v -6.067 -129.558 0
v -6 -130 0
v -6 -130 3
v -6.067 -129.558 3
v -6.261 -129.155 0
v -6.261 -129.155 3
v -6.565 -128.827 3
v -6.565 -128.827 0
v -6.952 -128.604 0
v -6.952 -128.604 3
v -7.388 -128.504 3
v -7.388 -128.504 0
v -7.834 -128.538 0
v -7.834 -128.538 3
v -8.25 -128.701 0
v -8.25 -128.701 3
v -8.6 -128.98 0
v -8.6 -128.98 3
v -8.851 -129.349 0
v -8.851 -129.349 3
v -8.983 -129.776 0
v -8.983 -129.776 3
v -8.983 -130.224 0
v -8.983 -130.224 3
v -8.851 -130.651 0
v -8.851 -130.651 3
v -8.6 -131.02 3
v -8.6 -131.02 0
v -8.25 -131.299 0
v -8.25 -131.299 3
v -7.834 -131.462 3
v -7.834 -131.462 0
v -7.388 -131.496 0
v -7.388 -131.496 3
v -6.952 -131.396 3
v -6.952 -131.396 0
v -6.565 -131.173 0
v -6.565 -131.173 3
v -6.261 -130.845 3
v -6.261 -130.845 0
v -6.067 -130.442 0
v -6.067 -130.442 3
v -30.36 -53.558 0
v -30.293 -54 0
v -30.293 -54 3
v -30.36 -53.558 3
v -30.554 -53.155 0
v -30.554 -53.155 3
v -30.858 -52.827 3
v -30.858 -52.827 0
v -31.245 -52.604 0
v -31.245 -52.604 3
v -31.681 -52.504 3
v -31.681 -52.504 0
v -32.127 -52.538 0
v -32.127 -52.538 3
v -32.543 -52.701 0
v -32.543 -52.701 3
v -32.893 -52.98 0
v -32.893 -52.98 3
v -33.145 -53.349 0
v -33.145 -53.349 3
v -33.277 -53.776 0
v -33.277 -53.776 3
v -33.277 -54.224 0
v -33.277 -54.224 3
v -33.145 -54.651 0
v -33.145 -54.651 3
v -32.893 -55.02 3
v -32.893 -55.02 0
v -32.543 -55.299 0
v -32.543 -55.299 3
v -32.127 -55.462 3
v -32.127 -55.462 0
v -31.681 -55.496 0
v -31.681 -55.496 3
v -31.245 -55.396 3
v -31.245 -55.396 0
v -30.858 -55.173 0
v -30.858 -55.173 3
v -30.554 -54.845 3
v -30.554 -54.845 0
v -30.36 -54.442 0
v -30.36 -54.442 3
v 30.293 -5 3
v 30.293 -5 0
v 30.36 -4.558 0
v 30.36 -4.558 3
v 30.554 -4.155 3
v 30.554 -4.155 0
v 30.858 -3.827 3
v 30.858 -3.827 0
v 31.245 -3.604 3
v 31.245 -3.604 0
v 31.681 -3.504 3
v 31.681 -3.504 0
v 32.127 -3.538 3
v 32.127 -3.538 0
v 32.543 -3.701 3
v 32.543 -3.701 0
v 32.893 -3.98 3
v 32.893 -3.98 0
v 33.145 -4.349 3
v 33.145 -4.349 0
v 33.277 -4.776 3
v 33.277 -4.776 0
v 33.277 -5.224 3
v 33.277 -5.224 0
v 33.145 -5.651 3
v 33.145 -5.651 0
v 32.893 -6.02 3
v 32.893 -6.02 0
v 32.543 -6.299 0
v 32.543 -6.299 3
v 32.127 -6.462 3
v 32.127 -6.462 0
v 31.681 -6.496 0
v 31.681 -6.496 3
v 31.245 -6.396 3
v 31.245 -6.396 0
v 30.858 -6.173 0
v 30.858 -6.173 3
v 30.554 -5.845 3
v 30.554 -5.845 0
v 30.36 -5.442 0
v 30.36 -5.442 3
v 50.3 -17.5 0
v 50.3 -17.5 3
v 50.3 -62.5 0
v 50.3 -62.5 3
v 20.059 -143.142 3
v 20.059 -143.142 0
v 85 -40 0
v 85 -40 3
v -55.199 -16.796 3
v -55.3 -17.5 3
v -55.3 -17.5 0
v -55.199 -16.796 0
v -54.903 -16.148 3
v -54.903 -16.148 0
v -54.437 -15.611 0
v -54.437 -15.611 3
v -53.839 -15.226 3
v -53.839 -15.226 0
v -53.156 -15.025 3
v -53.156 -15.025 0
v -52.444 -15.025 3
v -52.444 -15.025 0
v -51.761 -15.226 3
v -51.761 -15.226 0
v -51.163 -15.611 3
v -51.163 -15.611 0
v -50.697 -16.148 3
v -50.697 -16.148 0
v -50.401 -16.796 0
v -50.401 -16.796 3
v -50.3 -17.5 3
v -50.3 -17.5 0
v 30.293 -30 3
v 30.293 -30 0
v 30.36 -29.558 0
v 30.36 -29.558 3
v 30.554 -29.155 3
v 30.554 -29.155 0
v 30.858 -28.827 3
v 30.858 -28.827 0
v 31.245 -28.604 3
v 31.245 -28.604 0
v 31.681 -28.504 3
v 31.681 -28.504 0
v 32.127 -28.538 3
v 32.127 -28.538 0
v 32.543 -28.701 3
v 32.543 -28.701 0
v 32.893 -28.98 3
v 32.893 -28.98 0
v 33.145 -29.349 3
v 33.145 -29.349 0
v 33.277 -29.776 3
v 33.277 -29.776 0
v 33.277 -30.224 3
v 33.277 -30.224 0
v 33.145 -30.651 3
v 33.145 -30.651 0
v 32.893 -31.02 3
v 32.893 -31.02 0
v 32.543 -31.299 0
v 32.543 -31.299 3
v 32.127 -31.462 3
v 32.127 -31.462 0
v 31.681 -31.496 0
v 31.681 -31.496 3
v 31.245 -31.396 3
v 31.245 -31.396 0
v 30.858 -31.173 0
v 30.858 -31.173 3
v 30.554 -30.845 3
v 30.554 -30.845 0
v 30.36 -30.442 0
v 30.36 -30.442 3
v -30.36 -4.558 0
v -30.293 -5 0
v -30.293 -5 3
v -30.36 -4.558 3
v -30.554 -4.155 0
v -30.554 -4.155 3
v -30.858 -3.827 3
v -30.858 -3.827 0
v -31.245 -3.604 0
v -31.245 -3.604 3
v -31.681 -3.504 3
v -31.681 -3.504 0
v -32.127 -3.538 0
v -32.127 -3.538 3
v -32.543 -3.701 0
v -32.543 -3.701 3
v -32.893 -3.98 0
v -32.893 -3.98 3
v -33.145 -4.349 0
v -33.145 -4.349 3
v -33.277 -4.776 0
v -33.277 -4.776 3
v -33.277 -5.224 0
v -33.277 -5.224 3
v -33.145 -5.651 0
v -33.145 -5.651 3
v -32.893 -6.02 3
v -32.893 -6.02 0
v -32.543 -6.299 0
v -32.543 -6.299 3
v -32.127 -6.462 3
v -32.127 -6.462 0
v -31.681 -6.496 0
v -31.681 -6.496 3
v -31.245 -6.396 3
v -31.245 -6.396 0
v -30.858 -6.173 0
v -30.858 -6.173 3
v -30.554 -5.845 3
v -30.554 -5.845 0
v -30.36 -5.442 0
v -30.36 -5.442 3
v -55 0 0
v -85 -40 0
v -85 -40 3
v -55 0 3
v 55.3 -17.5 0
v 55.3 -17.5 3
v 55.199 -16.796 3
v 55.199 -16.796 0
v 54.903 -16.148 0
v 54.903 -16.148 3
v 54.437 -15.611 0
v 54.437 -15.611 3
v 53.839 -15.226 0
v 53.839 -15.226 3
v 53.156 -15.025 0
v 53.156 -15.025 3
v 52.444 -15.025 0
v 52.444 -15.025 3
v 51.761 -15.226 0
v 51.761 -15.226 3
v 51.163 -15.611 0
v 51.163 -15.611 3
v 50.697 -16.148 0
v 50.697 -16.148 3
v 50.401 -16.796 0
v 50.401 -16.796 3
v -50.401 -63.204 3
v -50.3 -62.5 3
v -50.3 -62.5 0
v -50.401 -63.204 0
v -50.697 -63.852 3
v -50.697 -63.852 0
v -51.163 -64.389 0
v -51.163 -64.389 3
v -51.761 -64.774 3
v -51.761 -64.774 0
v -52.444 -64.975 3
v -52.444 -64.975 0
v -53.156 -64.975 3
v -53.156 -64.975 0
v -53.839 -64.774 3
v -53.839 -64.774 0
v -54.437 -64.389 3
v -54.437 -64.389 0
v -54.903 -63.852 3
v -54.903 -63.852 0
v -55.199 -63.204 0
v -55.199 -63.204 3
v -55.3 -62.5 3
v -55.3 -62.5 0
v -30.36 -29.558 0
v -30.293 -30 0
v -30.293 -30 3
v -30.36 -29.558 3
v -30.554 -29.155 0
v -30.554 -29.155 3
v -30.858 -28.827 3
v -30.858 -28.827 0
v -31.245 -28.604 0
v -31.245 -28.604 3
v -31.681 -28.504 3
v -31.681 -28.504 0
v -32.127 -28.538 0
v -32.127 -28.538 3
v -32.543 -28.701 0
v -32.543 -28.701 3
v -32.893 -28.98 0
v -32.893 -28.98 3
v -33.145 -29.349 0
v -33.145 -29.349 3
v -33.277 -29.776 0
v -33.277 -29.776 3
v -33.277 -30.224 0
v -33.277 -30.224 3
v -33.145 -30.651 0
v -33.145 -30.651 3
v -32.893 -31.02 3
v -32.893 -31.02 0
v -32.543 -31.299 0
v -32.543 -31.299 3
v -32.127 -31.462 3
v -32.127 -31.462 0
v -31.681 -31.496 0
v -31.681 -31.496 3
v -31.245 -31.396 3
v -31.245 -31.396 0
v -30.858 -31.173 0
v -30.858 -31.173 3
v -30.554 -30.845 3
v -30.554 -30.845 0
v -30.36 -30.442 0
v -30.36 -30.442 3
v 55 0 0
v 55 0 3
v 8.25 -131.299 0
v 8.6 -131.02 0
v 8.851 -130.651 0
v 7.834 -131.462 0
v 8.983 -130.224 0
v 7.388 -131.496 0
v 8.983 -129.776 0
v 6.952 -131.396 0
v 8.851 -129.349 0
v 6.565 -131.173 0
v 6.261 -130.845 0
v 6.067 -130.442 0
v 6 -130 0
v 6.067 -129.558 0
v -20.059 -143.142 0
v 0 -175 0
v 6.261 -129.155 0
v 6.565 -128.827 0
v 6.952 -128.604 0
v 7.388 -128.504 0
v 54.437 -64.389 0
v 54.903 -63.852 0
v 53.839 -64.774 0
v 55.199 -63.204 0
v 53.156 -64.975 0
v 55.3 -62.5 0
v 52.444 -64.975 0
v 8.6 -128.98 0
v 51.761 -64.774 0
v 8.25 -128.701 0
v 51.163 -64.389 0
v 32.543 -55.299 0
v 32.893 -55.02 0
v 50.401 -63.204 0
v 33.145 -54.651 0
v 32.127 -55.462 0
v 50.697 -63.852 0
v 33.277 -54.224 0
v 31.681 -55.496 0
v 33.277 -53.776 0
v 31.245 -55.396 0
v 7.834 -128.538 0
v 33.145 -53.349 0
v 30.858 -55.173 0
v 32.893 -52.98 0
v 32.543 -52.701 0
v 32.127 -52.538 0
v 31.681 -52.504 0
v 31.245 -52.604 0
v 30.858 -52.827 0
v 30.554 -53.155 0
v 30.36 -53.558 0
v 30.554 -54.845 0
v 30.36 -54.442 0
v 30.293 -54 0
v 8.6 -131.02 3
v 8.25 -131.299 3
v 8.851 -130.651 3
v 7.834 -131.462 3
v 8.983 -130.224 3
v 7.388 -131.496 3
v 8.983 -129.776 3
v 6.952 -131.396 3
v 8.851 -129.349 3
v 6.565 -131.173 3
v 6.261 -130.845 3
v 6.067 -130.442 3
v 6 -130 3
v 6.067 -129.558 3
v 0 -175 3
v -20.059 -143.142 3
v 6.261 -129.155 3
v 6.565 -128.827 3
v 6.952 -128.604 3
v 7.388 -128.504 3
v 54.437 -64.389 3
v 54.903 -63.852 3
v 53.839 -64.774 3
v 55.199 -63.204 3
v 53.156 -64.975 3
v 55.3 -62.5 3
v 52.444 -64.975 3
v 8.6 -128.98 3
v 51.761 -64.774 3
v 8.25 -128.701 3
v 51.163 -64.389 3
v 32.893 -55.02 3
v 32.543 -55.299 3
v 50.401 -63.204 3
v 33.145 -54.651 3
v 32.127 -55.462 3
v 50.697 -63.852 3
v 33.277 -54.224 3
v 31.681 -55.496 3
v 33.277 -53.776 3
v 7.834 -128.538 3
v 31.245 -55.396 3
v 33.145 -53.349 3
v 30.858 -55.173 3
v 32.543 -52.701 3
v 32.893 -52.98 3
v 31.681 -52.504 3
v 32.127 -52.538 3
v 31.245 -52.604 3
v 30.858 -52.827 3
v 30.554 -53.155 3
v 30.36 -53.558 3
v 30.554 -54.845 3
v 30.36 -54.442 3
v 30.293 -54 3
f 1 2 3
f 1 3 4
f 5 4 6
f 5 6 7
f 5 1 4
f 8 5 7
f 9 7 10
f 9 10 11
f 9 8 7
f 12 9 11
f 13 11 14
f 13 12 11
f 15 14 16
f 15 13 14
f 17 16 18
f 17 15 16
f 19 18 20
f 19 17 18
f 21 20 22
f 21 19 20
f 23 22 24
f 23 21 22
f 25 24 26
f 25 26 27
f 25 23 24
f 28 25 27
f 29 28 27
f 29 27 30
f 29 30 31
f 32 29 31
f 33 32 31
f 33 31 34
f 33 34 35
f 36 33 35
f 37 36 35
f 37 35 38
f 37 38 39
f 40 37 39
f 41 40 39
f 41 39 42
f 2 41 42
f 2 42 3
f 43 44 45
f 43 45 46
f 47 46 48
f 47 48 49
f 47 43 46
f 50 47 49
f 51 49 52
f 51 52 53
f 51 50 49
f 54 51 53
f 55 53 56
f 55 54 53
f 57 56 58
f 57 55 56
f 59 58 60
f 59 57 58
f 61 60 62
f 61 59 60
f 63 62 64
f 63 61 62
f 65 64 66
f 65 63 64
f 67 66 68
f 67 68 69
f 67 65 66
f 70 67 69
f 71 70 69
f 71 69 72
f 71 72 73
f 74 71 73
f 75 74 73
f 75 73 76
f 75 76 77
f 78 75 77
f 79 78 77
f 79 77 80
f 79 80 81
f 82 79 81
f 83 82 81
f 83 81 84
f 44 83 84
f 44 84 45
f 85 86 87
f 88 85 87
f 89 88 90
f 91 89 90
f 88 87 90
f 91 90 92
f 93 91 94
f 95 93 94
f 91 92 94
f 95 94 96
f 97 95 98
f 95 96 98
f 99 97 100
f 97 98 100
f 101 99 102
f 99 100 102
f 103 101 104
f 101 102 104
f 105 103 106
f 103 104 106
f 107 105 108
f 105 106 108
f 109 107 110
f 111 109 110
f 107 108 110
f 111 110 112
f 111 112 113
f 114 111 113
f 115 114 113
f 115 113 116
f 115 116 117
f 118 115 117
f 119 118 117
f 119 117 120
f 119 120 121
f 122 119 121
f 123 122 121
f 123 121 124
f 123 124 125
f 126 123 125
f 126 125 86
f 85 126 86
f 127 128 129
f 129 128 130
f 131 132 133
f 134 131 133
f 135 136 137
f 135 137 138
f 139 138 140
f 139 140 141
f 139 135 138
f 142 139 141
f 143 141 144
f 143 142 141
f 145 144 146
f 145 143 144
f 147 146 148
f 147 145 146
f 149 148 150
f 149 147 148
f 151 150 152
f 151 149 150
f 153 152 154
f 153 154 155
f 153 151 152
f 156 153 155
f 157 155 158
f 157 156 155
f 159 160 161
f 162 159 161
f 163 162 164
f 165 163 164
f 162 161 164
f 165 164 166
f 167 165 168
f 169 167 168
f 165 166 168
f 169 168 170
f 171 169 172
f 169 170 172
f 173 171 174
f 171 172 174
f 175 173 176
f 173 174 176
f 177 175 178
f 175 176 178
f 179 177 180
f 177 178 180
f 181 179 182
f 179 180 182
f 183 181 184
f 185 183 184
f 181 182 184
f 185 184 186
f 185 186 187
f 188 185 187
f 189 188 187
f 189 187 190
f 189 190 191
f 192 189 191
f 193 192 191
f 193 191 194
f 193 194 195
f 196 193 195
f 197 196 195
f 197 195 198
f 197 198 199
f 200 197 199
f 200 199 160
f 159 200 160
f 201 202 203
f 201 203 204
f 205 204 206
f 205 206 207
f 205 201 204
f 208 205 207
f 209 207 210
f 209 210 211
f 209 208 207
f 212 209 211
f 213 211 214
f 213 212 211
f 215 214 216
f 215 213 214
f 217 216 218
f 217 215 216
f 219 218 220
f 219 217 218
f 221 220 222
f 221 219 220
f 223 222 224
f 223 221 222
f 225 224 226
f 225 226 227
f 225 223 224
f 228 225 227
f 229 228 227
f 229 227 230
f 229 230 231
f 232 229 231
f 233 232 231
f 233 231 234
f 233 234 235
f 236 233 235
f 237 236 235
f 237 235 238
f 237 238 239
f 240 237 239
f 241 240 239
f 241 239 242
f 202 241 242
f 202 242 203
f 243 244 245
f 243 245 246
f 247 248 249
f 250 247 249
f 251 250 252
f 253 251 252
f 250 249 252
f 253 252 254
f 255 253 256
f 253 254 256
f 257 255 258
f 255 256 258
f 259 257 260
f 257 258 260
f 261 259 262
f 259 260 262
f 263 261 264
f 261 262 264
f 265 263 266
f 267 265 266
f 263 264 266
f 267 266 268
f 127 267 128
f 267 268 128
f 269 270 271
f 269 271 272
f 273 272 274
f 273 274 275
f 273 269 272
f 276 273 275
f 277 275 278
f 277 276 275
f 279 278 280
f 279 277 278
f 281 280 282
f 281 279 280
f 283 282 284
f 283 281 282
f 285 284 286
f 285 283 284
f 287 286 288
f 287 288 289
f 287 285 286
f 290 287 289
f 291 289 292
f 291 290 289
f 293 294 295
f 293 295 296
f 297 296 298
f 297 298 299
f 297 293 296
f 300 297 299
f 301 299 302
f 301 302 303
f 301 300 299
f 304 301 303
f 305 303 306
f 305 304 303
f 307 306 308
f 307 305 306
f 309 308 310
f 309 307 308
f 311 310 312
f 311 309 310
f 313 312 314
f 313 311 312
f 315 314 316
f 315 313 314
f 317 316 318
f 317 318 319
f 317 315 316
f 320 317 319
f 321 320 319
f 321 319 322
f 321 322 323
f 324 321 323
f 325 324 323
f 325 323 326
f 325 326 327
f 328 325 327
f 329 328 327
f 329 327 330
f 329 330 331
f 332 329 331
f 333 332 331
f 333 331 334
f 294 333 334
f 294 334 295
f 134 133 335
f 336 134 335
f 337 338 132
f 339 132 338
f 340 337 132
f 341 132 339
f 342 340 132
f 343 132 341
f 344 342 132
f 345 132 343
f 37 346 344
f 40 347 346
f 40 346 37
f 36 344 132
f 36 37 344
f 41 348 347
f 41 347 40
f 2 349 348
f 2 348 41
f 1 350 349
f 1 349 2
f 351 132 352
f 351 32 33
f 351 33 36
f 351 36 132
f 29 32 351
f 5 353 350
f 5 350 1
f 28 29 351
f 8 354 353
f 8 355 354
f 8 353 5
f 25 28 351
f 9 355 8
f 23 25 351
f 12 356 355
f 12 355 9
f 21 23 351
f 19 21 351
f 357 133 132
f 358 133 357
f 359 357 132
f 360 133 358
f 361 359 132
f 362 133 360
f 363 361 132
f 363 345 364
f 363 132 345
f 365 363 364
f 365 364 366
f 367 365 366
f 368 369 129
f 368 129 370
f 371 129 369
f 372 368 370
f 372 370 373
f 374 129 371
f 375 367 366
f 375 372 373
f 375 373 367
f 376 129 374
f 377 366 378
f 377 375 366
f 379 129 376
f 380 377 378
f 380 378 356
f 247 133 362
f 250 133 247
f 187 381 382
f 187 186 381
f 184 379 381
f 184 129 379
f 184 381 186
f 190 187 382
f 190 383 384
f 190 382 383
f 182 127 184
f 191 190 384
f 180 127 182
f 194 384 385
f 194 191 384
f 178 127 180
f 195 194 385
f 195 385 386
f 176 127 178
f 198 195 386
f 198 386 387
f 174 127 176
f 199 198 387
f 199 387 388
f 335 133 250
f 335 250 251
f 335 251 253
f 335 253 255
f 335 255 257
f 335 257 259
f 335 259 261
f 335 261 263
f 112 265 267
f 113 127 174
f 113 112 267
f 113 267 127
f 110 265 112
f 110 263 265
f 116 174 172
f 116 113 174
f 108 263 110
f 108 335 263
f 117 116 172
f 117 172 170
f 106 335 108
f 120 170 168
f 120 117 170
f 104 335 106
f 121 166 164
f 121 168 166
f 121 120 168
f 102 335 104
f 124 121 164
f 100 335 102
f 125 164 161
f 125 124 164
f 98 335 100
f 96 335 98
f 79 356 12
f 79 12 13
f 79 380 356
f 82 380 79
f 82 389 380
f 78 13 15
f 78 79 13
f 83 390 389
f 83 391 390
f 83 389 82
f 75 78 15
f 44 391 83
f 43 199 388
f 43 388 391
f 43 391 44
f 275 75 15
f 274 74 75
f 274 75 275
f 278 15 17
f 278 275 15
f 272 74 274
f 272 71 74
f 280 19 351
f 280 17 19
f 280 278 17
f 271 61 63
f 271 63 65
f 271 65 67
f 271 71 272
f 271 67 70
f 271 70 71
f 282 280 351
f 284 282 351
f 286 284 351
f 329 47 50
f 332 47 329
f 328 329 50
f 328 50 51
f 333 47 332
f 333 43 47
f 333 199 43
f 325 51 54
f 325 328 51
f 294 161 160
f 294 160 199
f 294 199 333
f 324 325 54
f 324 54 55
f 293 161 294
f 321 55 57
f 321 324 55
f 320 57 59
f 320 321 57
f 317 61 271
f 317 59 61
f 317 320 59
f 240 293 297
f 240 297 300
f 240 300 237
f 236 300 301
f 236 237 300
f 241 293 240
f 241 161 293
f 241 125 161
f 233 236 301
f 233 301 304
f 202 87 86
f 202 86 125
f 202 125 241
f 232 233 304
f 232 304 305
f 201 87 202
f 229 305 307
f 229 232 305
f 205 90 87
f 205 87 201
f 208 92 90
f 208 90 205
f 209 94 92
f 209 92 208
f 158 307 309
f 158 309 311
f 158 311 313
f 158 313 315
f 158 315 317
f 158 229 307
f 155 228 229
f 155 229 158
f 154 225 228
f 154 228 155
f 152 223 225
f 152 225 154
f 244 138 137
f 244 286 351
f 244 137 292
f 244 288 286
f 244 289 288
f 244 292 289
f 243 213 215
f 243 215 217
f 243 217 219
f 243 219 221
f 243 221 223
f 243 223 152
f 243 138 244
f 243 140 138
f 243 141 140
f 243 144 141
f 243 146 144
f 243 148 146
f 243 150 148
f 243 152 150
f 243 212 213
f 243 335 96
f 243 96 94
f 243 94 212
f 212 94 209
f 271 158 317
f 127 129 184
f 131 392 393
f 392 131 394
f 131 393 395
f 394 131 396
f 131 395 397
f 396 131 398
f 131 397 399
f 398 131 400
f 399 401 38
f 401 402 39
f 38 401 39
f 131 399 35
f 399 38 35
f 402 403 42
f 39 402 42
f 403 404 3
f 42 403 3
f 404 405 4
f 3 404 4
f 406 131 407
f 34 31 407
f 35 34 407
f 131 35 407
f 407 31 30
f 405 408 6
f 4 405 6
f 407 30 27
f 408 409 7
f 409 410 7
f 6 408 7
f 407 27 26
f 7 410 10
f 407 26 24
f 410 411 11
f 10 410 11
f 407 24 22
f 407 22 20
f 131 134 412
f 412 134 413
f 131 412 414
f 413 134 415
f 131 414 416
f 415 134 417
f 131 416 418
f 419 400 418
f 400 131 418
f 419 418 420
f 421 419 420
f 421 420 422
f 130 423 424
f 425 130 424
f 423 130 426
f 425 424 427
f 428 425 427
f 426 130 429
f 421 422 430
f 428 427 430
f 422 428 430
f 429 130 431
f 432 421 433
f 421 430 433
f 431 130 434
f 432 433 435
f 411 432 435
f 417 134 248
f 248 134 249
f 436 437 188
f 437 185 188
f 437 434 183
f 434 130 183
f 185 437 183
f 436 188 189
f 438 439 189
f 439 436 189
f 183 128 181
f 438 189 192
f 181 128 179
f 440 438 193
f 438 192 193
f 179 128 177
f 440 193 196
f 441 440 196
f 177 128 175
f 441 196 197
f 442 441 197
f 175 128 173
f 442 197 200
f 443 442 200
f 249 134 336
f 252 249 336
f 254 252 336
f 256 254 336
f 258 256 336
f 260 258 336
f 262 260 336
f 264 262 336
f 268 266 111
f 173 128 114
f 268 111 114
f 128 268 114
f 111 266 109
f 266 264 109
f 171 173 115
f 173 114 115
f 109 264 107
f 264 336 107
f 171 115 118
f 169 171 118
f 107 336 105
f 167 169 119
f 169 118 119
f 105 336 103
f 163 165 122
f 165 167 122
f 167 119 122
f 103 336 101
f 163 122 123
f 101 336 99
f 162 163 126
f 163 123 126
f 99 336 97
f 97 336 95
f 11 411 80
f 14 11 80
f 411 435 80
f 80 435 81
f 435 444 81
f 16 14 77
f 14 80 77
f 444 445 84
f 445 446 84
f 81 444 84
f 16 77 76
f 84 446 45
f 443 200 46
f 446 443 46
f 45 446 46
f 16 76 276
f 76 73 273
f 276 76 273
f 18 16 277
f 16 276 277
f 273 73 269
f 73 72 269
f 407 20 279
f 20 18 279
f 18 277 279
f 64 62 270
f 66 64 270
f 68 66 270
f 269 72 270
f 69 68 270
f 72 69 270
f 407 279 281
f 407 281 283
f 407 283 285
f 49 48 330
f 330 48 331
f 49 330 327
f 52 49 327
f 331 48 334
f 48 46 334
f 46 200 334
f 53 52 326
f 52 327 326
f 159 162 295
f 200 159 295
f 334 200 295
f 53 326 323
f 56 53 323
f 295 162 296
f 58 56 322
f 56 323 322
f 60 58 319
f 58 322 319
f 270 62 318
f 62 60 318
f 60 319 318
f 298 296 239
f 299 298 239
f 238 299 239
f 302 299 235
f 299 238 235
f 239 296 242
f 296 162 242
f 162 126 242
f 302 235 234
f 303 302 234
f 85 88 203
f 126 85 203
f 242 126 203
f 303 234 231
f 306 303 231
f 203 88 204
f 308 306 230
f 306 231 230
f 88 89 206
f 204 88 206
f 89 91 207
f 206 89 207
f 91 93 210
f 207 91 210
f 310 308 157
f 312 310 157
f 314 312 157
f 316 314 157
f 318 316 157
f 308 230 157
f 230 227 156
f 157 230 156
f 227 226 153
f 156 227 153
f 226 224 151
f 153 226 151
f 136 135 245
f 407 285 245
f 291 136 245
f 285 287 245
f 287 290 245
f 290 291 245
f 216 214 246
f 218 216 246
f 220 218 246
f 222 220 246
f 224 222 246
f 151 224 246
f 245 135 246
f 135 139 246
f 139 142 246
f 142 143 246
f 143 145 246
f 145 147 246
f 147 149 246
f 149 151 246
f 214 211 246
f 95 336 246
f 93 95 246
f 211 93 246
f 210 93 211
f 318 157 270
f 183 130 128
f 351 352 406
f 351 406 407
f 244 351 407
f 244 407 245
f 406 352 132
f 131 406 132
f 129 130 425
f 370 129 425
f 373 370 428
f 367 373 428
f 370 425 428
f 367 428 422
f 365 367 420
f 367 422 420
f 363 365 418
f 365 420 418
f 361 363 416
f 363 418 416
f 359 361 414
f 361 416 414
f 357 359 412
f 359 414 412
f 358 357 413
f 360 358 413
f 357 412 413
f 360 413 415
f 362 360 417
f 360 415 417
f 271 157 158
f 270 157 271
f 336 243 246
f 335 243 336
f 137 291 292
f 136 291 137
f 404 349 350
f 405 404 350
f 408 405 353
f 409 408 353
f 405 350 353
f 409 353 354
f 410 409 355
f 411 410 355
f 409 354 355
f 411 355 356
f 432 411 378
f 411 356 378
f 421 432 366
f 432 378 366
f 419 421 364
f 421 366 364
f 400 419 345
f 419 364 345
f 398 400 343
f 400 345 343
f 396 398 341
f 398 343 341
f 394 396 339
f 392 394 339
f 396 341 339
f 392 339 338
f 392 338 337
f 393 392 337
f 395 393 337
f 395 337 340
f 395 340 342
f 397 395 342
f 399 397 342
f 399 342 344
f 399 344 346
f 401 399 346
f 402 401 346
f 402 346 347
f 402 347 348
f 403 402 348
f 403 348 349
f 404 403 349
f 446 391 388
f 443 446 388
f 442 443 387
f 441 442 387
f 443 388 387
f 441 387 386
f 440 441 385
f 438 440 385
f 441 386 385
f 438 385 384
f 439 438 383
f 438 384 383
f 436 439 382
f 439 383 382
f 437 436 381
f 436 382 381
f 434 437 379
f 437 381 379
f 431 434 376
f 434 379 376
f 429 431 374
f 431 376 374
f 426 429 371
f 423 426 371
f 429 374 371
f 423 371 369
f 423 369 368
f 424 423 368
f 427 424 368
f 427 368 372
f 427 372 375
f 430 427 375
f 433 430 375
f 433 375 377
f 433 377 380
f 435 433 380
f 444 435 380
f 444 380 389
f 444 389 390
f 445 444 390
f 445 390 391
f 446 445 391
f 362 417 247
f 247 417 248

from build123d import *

# Parameters (mm, degrees)
F1_DEPTH = 3
F4_D     = 3
F6_D     = 3
F9_DEPTH = 34.3733802438


with BuildPart() as f1:
    # F0 (on Top) → F1 (new body)
    with BuildSketch(Plane.XY):
        Polygon((55, 0), (0, 0), (0, -143.1418224907), (20.0588525058, -143.1418224907), (85, -40), align=None)
        Polygon((20.0588525058, -143.1418224907), (0, -143.1418224907), (0, -175), align=None)
    extrude(amount=F1_DEPTH)

    # F4 (through all)
    with Locations(Plane.XY.offset(3)):
        with Locations((7.5, -130)):
            Hole(F4_D / 2)

    # F6 (through all)
    with Locations(Plane.XY.offset(3)):
        with Locations((31.7933925533, -30), (31.7933925533, -54), (31.7933925533, -5)):
            Hole(F6_D / 2)

    # F8 (on face) → F9 (cut)
    with BuildSketch(Plane.XY.offset(3)):
        with BuildLine():
            ThreePointArc((55.3, -17.5), (52.8, -15), (50.3, -17.5))
            Line((50.3, -17.5), (50.3, -62.5))
            ThreePointArc((50.3, -62.5), (52.8, -65), (55.3, -62.5))
            Line((55.3, -62.5), (55.3, -17.5))
        make_face()
    extrude(amount=-F9_DEPTH, mode=Mode.SUBTRACT)

    # F10: F1 across plane


with BuildPart() as f1_1:
    add(f1.part)
    add(f1.part.mirror(Plane.YZ))


solid = f1_1.part
